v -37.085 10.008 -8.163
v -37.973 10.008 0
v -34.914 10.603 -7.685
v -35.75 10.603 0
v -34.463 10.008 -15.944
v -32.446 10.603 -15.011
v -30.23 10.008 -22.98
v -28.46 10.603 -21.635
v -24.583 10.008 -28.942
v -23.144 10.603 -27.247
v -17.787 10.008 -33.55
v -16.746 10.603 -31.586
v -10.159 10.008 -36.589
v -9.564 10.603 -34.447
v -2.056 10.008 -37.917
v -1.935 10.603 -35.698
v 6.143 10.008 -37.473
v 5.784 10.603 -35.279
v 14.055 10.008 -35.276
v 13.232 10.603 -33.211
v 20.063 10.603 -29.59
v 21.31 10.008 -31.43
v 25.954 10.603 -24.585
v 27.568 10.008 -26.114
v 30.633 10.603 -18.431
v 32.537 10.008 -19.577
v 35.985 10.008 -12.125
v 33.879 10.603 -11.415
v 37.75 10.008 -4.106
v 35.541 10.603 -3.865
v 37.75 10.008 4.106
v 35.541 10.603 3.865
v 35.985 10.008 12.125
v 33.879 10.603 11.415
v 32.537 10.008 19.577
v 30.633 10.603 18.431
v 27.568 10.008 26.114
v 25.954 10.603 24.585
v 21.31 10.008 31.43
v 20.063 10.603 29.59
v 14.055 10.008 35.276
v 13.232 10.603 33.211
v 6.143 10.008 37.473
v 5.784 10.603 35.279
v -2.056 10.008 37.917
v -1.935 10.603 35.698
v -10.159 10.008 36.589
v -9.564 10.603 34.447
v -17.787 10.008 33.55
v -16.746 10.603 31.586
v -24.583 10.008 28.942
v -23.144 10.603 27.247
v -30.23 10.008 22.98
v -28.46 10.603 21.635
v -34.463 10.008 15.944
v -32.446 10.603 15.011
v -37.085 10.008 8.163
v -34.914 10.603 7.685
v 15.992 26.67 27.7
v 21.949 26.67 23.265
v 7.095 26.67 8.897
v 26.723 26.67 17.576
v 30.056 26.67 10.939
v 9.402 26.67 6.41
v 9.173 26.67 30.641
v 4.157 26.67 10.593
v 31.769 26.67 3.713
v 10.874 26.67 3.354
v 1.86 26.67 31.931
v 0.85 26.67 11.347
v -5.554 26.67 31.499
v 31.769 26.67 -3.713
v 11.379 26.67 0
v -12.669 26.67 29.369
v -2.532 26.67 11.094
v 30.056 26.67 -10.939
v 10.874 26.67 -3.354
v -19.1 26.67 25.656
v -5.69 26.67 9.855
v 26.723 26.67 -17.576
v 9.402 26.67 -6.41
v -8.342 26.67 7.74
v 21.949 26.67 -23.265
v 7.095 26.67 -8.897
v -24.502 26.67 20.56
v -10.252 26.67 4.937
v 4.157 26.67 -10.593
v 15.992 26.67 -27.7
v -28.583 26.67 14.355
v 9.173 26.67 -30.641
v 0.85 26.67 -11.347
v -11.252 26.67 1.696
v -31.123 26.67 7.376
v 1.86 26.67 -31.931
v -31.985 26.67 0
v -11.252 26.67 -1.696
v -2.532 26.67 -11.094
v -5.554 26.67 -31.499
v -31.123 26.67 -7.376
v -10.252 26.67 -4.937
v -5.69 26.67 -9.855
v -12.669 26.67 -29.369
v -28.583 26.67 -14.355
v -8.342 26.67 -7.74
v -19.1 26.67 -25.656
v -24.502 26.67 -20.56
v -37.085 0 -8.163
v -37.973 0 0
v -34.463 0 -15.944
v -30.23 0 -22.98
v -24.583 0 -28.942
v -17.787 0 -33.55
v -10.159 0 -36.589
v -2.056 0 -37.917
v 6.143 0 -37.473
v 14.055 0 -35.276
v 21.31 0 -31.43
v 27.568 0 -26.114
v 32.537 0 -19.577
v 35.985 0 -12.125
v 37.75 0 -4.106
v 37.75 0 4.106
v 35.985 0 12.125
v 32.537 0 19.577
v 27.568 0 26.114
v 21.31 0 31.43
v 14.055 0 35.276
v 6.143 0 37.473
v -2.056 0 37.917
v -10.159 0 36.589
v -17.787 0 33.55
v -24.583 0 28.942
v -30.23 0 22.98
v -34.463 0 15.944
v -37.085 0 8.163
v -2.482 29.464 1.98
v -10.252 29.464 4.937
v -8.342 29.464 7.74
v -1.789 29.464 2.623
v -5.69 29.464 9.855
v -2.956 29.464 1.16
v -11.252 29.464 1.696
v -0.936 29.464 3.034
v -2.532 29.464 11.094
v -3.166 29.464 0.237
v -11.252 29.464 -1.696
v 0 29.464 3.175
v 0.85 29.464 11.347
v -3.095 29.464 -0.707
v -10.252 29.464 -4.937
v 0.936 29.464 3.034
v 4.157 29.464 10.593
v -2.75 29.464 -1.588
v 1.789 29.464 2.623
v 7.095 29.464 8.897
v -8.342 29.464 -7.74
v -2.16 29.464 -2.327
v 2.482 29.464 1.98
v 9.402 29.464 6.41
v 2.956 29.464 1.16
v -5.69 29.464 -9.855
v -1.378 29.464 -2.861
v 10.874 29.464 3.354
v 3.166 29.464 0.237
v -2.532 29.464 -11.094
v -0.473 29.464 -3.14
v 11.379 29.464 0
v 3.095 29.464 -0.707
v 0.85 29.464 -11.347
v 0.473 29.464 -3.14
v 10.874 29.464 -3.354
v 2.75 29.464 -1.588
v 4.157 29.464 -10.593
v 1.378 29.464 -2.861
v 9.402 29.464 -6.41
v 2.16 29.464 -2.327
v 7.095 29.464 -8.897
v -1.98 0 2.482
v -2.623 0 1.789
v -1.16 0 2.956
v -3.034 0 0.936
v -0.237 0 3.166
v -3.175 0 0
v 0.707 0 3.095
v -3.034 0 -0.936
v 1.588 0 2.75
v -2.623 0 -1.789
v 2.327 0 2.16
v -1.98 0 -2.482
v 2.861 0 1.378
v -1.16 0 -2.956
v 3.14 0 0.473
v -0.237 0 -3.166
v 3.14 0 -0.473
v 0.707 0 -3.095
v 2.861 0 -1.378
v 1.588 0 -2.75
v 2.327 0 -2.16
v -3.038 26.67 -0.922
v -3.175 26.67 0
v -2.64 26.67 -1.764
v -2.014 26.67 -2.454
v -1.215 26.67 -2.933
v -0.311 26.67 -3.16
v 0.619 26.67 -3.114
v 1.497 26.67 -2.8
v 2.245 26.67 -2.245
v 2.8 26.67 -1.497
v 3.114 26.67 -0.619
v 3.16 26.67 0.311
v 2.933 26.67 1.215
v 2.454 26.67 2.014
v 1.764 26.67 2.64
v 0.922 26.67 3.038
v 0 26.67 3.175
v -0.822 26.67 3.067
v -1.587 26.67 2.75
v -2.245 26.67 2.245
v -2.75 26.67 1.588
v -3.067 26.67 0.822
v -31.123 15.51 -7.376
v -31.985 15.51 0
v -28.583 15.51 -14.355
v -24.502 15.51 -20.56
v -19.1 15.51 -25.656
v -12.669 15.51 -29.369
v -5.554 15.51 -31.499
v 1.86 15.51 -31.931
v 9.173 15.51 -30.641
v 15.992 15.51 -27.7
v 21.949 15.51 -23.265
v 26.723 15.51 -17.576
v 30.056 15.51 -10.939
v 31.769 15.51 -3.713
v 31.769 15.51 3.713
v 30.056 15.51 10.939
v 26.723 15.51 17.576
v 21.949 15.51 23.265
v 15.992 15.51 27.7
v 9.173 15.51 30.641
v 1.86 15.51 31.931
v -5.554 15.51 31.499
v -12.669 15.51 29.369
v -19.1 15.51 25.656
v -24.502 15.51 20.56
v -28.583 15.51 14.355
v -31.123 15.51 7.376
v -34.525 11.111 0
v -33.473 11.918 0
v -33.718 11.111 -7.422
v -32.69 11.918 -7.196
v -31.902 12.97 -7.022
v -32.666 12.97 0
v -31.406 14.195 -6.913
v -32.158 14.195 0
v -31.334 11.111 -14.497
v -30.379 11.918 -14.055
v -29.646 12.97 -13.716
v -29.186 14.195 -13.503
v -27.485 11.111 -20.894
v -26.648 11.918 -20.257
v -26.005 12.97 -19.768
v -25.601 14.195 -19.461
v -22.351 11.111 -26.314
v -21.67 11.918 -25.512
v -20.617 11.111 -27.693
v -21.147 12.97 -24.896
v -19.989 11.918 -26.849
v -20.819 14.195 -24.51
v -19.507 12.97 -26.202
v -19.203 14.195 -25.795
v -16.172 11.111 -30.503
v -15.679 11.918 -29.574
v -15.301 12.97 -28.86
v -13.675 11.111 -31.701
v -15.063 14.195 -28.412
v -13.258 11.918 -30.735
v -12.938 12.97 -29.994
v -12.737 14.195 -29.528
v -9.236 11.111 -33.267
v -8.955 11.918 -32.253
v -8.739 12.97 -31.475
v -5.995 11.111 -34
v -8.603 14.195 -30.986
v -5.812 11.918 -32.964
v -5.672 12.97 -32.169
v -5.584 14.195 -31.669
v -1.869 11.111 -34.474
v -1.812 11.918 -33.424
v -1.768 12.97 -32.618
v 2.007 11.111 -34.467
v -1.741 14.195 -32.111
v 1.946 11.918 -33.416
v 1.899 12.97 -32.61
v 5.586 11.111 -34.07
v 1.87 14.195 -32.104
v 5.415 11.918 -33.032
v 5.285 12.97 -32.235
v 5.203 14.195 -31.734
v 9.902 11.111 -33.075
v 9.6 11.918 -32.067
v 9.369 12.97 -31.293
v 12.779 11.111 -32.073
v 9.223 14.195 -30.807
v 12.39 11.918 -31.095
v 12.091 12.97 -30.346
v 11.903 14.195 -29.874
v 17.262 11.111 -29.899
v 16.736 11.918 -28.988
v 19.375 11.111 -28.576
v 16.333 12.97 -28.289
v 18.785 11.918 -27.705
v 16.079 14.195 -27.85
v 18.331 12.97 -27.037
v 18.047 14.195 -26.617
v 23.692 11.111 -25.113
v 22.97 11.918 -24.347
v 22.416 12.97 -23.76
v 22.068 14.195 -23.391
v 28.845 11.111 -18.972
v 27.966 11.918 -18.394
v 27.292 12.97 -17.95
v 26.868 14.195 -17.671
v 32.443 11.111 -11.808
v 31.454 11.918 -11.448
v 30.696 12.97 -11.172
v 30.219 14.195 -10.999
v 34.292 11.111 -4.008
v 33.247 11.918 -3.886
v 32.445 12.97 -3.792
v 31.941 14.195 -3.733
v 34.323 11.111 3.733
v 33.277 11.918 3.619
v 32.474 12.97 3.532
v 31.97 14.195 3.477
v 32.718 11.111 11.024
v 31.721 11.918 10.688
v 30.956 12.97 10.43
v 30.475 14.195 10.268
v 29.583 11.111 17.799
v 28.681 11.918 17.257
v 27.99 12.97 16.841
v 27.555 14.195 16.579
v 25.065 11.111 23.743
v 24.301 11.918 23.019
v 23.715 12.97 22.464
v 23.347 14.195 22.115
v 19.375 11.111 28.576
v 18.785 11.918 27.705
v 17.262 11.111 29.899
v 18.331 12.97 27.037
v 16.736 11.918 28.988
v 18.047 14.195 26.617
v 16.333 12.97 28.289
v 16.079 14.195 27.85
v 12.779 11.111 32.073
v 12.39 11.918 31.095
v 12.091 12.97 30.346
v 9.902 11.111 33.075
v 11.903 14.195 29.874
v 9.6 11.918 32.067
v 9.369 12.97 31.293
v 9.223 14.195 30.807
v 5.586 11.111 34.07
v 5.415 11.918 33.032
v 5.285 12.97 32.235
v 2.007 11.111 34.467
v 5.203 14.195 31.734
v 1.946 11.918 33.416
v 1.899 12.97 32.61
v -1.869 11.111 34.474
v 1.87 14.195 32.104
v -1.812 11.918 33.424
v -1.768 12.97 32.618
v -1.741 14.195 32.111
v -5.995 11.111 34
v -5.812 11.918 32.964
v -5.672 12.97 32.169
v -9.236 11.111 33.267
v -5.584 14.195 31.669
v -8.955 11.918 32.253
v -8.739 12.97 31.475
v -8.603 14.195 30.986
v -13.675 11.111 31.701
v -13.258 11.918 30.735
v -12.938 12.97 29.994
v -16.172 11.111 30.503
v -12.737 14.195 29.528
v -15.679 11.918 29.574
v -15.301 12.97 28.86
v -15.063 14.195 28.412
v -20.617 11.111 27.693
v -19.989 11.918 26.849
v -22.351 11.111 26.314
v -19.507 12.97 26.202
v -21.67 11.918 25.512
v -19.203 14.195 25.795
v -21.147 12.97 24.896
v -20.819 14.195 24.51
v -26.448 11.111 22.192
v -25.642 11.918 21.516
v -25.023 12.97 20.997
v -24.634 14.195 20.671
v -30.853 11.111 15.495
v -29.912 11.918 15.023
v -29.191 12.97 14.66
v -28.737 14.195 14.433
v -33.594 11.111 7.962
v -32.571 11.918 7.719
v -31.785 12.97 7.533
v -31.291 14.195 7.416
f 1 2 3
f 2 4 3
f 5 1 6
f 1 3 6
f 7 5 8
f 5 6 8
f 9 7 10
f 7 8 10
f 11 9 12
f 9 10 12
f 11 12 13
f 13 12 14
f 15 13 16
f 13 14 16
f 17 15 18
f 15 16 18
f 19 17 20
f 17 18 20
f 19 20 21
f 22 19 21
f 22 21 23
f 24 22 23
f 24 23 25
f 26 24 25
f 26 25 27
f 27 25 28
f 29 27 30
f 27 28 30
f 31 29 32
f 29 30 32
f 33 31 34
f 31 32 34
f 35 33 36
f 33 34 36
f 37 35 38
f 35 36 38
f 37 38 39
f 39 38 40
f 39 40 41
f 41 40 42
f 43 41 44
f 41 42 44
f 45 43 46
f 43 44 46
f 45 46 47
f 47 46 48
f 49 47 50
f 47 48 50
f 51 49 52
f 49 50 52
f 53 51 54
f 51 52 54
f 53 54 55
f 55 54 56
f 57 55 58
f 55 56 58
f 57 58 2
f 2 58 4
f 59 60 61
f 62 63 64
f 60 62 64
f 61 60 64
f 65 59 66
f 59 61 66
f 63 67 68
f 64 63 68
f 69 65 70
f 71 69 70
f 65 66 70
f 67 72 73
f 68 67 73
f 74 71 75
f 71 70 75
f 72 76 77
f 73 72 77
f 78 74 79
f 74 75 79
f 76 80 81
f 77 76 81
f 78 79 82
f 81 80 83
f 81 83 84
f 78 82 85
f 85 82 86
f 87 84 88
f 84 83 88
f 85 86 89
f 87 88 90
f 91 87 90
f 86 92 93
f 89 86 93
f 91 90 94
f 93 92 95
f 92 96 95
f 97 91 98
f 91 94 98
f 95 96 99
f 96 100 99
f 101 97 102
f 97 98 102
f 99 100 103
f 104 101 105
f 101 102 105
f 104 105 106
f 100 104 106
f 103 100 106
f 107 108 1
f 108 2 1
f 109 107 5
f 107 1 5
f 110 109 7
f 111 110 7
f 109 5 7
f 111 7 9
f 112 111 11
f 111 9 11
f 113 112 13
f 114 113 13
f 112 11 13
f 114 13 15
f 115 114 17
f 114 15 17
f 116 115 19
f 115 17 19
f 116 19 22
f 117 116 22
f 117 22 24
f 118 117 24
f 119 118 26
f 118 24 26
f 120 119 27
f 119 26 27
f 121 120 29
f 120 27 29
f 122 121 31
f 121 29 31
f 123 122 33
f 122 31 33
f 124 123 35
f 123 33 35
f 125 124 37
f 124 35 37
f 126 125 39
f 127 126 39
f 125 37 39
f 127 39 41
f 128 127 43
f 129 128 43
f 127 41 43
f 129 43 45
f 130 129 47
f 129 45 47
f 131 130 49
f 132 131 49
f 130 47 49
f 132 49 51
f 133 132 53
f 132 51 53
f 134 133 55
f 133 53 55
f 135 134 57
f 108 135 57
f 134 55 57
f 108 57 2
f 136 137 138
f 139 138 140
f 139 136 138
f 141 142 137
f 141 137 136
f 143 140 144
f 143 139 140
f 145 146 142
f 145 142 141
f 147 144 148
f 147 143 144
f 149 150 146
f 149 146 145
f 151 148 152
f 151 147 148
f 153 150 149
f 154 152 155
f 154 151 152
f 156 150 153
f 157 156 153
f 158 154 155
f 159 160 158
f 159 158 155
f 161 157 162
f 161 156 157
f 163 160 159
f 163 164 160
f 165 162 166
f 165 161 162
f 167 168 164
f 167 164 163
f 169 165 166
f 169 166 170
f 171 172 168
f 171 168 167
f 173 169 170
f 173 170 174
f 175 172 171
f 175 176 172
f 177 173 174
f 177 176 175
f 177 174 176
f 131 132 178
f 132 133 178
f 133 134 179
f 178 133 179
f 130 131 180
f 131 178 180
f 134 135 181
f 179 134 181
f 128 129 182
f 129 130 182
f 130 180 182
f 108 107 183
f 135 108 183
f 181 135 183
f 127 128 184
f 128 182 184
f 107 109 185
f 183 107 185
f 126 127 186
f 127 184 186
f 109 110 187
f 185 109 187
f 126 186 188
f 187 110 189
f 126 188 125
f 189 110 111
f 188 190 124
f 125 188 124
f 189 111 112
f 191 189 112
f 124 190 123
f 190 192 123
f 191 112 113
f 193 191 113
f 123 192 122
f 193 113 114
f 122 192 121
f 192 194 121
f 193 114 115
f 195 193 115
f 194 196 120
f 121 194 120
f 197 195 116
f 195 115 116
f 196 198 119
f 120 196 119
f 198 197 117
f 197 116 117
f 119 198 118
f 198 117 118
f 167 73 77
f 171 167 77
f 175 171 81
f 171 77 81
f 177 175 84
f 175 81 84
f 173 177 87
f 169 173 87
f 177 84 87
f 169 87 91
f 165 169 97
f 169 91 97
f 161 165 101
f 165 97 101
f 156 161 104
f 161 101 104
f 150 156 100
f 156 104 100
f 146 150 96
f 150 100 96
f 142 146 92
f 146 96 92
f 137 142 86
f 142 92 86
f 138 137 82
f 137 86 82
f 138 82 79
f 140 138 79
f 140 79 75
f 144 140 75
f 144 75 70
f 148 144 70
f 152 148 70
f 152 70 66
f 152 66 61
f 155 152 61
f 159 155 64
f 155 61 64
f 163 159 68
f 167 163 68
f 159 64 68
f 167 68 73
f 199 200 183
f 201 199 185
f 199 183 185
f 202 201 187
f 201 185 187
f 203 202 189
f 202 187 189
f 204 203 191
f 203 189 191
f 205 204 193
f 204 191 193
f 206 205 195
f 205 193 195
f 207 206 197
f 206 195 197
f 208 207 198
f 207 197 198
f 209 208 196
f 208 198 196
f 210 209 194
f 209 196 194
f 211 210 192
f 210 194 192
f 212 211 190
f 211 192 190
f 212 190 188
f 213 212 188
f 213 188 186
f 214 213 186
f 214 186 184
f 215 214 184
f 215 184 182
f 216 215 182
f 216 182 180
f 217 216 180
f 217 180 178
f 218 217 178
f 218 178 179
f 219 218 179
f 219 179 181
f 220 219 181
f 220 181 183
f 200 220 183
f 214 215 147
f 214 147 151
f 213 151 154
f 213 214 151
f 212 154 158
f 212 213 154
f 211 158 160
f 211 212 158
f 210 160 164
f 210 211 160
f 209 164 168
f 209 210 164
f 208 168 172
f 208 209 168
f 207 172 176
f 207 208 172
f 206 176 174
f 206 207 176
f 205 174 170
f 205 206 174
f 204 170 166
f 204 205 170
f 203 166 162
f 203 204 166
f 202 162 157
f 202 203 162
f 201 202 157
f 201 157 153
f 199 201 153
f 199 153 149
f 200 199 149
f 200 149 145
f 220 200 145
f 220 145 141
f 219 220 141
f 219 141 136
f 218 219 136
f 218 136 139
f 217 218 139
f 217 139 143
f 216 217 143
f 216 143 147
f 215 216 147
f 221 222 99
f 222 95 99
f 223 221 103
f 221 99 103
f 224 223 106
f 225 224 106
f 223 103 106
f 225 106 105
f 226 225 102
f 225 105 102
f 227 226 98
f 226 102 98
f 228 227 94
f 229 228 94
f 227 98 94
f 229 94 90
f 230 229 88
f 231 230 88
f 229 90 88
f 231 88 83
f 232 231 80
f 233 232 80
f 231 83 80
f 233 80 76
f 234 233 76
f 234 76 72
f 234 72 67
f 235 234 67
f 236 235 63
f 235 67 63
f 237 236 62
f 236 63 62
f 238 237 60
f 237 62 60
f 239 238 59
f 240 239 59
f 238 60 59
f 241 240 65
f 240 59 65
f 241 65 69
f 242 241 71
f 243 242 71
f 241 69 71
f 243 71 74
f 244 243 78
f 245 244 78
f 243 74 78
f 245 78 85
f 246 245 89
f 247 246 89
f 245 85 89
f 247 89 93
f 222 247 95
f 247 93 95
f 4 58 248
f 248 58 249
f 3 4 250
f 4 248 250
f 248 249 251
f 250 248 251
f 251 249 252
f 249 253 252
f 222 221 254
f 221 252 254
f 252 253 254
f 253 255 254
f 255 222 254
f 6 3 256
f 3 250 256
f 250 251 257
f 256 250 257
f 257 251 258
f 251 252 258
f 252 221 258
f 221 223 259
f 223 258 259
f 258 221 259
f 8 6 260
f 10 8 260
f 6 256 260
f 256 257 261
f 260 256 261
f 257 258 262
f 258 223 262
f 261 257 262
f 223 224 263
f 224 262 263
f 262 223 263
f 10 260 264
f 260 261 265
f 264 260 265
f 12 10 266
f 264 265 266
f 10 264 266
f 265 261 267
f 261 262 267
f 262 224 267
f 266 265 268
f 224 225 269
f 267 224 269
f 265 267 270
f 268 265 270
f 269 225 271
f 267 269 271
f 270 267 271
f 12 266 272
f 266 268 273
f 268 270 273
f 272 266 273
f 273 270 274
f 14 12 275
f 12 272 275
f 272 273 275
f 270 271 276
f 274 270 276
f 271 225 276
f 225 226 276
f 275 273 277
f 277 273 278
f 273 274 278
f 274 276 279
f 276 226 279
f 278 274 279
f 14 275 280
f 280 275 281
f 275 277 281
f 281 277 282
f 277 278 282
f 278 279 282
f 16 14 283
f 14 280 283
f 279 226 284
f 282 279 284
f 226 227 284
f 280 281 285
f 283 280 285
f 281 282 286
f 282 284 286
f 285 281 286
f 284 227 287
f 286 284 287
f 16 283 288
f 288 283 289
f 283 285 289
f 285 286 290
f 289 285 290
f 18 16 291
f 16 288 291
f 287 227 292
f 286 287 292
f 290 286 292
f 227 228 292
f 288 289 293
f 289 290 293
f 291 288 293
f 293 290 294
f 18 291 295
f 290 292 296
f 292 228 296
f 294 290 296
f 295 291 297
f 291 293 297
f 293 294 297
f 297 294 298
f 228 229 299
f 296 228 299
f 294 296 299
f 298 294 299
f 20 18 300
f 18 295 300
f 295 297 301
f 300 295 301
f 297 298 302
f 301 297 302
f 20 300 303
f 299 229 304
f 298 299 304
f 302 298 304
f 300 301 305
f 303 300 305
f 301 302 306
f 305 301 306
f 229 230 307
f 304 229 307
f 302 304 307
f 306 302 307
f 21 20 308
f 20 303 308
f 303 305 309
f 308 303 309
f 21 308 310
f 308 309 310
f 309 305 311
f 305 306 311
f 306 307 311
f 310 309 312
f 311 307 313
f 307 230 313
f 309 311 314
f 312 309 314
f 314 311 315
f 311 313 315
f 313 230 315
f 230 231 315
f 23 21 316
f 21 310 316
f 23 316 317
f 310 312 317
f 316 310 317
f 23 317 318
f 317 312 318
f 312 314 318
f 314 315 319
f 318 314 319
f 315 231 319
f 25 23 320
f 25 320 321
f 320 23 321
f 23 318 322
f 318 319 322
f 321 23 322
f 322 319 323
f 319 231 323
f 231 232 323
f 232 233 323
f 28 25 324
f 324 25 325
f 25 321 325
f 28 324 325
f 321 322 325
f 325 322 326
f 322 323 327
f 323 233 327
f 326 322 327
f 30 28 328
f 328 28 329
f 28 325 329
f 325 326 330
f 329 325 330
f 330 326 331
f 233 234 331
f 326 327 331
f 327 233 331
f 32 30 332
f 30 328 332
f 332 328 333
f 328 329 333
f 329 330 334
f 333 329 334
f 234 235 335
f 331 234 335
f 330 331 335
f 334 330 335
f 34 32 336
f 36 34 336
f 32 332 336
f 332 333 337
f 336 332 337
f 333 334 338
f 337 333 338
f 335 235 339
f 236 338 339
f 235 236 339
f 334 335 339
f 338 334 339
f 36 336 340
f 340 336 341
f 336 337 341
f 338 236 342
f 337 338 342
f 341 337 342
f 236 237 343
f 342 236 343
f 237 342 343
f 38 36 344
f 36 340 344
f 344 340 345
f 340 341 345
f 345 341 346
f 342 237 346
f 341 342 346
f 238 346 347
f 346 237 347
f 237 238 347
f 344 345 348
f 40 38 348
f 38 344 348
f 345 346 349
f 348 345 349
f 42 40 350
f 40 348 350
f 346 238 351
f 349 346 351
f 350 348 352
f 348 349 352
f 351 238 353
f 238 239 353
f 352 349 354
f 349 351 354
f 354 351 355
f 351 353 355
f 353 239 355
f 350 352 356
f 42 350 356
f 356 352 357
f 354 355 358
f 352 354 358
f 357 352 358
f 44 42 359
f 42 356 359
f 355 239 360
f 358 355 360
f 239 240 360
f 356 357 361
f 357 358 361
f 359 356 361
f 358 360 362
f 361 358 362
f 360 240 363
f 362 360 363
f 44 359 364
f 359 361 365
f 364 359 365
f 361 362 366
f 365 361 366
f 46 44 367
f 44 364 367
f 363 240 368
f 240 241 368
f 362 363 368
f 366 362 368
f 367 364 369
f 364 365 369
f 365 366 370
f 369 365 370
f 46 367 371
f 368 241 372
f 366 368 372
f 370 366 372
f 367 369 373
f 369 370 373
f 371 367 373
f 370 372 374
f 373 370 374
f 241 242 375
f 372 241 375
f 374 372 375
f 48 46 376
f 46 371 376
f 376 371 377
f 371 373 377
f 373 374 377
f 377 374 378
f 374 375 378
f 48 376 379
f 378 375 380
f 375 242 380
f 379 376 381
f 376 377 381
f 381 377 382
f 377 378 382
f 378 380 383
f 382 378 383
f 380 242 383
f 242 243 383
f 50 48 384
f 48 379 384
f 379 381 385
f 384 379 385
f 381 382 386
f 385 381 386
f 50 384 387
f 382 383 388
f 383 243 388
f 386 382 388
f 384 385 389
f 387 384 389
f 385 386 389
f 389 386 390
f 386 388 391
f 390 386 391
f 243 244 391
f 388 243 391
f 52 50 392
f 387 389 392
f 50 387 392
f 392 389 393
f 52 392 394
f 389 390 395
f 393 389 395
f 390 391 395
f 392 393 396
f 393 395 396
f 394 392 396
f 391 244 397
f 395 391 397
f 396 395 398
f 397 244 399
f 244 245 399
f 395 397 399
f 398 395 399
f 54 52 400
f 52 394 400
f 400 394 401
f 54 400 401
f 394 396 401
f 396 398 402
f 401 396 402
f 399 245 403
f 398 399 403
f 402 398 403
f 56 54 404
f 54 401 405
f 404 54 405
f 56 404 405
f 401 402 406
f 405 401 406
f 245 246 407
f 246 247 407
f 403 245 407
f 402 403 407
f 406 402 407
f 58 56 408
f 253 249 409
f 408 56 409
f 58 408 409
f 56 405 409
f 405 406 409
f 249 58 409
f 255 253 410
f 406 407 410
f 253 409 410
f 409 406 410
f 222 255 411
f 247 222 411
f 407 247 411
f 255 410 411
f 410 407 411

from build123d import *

# Parameters (mm, degrees)
F_1_4_0_25_DIAMETER_HOLE1_D = 6.35
SKETCH3_R                   = 11.3792
SKETCH3_R_2                 = 3.175
BOSS_EXTRUDE1_DEPTH         = 2.794


with BuildPart() as part:
    # Sketch1 → Revolve1 (revolve)
    with BuildSketch(Plane.XY, mode=Mode.PRIVATE) as revolve1_sk:
        with BuildLine():
            Line((0, 0), (37.973, 0))
            Line((37.973, 0), (37.973, 10.0076))
            Line((37.973, 10.0076), (35.750149251, 10.603211063))
            ThreePointArc((35.750149251, 10.603211063), (33.034715031, 12.417606201), (31.98495, 15.510114261))
            Line((31.98495, 15.510114261), (31.98495, 26.67))
            Line((31.98495, 26.67), (0, 26.67))
            Line((0, 26.67), (0, 0))
        make_face()
    revolve(revolve1_sk.sketch.rotate(Axis((0, 26.67, 0), (0, -1, 0)), 180), axis=Axis((0, 26.67, 0), (0, -1, 0)))

    # 1/4 (0.25) Diameter Hole1 (through all)
    with Locations(Plane(origin=(0, 26.67, 0), x_dir=(1, 0, 0), z_dir=(0, 1, 0))):
        with Locations((0, 0)):
            Hole(F_1_4_0_25_DIAMETER_HOLE1_D / 2)

    # Sketch3 → Boss-Extrude1 (add)
    with BuildSketch(Plane(origin=(0, 26.67, 0), x_dir=(1, 0, 0), z_dir=(0, 1, 0))):
        Circle(SKETCH3_R)
        with Locations(Location((0, 0, 0), (0, 0, 270))):
            Circle(SKETCH3_R_2, mode=Mode.SUBTRACT)
    extrude(amount=BOSS_EXTRUDE1_DEPTH)


solid = part.part
